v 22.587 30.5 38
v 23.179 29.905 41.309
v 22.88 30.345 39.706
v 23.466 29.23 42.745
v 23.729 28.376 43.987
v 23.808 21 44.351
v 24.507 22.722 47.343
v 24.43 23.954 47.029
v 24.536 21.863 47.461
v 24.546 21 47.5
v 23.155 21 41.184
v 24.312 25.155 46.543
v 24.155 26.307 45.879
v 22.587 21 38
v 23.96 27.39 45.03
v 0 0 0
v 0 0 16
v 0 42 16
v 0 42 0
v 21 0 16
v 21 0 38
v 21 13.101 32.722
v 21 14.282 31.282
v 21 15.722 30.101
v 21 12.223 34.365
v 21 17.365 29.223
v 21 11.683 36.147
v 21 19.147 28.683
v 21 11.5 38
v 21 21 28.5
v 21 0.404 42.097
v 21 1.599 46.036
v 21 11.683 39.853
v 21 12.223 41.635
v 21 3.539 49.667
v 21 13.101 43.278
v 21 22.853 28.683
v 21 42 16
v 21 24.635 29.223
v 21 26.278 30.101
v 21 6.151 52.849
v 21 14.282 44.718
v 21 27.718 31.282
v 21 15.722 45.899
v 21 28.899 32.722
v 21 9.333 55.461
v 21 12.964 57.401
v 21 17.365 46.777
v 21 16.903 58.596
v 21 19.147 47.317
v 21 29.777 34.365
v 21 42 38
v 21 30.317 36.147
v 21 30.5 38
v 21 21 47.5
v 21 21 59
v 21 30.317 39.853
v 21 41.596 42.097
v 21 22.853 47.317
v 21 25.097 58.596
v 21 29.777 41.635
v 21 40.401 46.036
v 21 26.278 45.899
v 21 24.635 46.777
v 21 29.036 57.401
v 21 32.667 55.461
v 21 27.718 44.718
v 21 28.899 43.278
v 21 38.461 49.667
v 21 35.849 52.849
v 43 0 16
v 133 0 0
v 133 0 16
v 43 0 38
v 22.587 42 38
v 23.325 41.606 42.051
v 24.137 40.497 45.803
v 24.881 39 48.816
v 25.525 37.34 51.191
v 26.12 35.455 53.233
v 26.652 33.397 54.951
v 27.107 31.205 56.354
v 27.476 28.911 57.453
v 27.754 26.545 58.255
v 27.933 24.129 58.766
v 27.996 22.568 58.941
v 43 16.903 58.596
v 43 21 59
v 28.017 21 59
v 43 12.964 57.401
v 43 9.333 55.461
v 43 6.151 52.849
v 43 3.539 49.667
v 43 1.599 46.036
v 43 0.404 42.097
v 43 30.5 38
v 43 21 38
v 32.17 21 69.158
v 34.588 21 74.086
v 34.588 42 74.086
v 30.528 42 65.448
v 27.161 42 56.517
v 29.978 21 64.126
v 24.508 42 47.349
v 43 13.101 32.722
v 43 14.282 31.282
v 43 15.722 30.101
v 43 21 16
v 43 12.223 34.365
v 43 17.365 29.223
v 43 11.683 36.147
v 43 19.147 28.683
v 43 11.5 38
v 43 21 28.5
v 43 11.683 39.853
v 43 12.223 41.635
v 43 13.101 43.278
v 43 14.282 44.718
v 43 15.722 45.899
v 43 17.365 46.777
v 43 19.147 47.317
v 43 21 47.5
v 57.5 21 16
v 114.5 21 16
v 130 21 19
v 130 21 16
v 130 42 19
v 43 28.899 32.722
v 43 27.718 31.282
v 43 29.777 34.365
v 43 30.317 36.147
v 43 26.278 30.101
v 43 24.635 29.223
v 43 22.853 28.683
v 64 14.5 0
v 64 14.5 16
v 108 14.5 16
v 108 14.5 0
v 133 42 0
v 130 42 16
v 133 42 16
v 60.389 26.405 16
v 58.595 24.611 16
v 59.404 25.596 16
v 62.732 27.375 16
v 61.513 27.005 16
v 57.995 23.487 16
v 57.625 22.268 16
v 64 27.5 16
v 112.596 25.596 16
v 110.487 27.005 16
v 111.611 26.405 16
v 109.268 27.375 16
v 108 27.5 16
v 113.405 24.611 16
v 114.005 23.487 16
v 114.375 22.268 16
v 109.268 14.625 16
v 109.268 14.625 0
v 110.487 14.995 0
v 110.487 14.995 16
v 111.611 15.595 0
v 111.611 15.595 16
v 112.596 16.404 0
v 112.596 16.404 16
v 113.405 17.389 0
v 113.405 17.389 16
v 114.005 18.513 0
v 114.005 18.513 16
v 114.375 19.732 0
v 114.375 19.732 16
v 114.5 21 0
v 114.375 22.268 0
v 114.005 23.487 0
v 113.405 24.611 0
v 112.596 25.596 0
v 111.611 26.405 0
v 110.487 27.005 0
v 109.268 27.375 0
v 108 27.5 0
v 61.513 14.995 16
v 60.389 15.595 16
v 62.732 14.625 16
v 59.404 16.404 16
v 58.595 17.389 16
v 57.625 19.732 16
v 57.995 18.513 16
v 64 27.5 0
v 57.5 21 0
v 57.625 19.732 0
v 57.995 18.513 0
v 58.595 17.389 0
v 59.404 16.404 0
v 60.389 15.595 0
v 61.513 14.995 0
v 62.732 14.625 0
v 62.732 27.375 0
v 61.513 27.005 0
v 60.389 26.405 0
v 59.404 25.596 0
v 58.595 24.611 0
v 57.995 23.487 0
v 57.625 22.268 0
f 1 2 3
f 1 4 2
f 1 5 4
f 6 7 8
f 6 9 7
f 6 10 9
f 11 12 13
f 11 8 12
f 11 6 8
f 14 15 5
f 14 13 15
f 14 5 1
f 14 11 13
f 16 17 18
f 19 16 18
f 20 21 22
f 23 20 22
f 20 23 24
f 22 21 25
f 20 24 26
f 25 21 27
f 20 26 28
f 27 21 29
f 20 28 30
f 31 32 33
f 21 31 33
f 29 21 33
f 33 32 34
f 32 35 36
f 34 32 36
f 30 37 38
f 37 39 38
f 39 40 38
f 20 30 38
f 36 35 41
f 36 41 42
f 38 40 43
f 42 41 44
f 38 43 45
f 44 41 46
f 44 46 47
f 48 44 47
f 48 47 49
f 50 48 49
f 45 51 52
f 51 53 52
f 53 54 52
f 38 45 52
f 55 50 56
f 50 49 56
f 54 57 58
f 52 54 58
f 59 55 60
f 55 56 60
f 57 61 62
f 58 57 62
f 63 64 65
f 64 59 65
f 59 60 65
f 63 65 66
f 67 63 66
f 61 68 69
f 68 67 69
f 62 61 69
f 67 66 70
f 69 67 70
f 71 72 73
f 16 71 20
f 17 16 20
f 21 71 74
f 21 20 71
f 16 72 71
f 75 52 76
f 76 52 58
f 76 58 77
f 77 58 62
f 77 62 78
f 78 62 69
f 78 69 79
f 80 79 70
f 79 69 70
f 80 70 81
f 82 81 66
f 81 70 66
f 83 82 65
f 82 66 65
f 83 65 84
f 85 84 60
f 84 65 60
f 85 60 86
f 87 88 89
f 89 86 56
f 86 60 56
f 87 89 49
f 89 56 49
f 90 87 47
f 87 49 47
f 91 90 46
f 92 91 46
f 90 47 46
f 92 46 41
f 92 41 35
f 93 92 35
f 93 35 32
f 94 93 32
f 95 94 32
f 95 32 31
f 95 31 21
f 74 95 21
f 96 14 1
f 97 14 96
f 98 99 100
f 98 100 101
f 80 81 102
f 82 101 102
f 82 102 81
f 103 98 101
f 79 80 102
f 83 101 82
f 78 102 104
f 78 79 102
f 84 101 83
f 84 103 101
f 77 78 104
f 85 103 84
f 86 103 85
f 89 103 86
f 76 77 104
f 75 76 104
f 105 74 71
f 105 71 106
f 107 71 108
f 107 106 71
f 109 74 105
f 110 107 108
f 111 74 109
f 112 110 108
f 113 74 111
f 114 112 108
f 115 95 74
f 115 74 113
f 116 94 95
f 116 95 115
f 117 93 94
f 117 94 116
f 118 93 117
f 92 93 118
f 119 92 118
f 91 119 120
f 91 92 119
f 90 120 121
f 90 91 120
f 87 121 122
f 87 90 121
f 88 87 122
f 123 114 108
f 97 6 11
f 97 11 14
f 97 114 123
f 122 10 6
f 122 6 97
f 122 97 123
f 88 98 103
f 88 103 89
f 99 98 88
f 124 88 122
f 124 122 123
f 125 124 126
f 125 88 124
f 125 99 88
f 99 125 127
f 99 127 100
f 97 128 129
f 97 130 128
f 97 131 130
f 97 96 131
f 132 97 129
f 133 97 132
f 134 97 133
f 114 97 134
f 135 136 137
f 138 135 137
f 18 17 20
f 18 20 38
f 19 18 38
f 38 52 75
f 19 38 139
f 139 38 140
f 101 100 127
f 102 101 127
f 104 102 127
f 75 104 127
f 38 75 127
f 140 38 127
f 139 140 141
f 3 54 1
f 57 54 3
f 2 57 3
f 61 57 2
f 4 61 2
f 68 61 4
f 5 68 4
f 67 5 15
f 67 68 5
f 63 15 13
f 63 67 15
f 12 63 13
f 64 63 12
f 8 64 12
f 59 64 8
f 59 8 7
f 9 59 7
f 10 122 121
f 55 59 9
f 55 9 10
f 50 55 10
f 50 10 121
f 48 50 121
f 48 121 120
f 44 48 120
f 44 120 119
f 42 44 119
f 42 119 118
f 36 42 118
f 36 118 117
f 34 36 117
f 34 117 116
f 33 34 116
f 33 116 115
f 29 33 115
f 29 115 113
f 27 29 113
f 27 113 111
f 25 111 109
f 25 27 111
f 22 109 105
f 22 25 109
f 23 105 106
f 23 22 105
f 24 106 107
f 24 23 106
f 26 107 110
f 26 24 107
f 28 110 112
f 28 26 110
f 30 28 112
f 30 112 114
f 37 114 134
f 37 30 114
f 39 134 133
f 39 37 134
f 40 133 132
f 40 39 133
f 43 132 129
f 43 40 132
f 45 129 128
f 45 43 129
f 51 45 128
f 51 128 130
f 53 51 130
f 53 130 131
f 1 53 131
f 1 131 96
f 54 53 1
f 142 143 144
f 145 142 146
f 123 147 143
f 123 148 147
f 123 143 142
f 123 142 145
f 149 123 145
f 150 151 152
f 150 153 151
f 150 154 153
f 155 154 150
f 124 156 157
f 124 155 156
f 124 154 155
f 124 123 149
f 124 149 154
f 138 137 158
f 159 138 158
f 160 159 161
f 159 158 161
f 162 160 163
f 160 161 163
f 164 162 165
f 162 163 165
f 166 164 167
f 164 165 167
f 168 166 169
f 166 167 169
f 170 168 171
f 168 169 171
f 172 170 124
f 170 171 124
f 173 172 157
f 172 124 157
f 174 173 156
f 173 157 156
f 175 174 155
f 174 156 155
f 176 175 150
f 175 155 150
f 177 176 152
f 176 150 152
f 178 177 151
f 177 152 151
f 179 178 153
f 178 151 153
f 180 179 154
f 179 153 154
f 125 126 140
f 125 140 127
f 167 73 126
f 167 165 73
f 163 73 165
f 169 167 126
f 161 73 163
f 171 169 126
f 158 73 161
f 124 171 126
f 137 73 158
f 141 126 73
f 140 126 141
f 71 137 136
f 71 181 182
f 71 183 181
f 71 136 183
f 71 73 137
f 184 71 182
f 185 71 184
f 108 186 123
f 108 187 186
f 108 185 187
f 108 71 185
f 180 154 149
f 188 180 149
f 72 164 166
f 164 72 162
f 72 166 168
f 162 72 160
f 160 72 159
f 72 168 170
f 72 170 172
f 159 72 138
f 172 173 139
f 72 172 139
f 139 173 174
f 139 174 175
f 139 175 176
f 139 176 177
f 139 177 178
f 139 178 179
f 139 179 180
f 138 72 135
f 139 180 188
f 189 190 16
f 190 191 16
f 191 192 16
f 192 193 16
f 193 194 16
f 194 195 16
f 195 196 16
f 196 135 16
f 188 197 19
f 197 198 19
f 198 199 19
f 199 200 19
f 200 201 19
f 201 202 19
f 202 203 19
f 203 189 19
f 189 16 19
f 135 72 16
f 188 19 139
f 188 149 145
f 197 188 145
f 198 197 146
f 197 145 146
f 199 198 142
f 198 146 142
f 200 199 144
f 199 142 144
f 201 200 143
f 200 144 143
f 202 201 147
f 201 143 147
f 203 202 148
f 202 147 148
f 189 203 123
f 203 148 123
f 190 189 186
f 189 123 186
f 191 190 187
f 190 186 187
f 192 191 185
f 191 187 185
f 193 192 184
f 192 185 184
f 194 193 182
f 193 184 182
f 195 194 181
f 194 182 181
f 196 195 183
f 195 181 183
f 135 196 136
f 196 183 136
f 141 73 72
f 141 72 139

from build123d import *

# Parameters (mm, degrees)
F0_W     = 42
F0_H     = 16
F1_DEPTH = 133
F2_START = 21
F0_R     = 9.5
F2_DEPTH = 22
F4_DEPTH = 25
F6_START = -21
F6_DEPTH = 21


with BuildPart() as f1:
    # F0 (on Right) → F1 (new body)
    with BuildSketch(Plane.YZ):
        with Locations((21, 8)):
            Rectangle(F0_W, F0_H)
    extrude(amount=F1_DEPTH)

    # F0 (on Right) → F2 (join)
    with BuildSketch(Plane.YZ.offset(F2_START)):
        with BuildLine():
            Line((0, 38), (0, 16))
            Line((0, 16), (42, 16))
            Line((42, 16), (42, 38))
            ThreePointArc((42, 38), (21, 59), (0, 38))
        make_face()
        with Locations((21, 38)):
            Circle(F0_R, mode=Mode.SUBTRACT)
    extrude(amount=F2_DEPTH)

    # F3 (on face) → F4 (cut)
    with BuildSketch(Plane.XY.offset(16)):
        with BuildLine():
            ThreePointArc((108, 14.5), (114.5, 21), (108, 27.5))
            Line((108, 27.5), (64, 27.5))
            ThreePointArc((64, 27.5), (57.5, 21), (64, 14.5))
            Line((64, 14.5), (108, 14.5))
        make_face()
    extrude(amount=-F4_DEPTH, mode=Mode.SUBTRACT)

    # F5 (on face) → F6 (join)
    with BuildSketch(Plane.XZ.offset(F6_START)):
        with BuildLine():
            Line((43, 16), (130, 16))
            Line((130, 16), (130, 19))
            Line((130, 19), (34.5883966818, 74.0859148596))
            ThreePointArc((34.5883966818, 74.0859148596), (27.1610557671, 56.5174050032), (22.5868188266, 38))
            Line((22.5868188266, 38), (43, 38))
            Line((43, 38), (43, 16))
        make_face()
    extrude(amount=-F6_DEPTH)


solid = f1.part
